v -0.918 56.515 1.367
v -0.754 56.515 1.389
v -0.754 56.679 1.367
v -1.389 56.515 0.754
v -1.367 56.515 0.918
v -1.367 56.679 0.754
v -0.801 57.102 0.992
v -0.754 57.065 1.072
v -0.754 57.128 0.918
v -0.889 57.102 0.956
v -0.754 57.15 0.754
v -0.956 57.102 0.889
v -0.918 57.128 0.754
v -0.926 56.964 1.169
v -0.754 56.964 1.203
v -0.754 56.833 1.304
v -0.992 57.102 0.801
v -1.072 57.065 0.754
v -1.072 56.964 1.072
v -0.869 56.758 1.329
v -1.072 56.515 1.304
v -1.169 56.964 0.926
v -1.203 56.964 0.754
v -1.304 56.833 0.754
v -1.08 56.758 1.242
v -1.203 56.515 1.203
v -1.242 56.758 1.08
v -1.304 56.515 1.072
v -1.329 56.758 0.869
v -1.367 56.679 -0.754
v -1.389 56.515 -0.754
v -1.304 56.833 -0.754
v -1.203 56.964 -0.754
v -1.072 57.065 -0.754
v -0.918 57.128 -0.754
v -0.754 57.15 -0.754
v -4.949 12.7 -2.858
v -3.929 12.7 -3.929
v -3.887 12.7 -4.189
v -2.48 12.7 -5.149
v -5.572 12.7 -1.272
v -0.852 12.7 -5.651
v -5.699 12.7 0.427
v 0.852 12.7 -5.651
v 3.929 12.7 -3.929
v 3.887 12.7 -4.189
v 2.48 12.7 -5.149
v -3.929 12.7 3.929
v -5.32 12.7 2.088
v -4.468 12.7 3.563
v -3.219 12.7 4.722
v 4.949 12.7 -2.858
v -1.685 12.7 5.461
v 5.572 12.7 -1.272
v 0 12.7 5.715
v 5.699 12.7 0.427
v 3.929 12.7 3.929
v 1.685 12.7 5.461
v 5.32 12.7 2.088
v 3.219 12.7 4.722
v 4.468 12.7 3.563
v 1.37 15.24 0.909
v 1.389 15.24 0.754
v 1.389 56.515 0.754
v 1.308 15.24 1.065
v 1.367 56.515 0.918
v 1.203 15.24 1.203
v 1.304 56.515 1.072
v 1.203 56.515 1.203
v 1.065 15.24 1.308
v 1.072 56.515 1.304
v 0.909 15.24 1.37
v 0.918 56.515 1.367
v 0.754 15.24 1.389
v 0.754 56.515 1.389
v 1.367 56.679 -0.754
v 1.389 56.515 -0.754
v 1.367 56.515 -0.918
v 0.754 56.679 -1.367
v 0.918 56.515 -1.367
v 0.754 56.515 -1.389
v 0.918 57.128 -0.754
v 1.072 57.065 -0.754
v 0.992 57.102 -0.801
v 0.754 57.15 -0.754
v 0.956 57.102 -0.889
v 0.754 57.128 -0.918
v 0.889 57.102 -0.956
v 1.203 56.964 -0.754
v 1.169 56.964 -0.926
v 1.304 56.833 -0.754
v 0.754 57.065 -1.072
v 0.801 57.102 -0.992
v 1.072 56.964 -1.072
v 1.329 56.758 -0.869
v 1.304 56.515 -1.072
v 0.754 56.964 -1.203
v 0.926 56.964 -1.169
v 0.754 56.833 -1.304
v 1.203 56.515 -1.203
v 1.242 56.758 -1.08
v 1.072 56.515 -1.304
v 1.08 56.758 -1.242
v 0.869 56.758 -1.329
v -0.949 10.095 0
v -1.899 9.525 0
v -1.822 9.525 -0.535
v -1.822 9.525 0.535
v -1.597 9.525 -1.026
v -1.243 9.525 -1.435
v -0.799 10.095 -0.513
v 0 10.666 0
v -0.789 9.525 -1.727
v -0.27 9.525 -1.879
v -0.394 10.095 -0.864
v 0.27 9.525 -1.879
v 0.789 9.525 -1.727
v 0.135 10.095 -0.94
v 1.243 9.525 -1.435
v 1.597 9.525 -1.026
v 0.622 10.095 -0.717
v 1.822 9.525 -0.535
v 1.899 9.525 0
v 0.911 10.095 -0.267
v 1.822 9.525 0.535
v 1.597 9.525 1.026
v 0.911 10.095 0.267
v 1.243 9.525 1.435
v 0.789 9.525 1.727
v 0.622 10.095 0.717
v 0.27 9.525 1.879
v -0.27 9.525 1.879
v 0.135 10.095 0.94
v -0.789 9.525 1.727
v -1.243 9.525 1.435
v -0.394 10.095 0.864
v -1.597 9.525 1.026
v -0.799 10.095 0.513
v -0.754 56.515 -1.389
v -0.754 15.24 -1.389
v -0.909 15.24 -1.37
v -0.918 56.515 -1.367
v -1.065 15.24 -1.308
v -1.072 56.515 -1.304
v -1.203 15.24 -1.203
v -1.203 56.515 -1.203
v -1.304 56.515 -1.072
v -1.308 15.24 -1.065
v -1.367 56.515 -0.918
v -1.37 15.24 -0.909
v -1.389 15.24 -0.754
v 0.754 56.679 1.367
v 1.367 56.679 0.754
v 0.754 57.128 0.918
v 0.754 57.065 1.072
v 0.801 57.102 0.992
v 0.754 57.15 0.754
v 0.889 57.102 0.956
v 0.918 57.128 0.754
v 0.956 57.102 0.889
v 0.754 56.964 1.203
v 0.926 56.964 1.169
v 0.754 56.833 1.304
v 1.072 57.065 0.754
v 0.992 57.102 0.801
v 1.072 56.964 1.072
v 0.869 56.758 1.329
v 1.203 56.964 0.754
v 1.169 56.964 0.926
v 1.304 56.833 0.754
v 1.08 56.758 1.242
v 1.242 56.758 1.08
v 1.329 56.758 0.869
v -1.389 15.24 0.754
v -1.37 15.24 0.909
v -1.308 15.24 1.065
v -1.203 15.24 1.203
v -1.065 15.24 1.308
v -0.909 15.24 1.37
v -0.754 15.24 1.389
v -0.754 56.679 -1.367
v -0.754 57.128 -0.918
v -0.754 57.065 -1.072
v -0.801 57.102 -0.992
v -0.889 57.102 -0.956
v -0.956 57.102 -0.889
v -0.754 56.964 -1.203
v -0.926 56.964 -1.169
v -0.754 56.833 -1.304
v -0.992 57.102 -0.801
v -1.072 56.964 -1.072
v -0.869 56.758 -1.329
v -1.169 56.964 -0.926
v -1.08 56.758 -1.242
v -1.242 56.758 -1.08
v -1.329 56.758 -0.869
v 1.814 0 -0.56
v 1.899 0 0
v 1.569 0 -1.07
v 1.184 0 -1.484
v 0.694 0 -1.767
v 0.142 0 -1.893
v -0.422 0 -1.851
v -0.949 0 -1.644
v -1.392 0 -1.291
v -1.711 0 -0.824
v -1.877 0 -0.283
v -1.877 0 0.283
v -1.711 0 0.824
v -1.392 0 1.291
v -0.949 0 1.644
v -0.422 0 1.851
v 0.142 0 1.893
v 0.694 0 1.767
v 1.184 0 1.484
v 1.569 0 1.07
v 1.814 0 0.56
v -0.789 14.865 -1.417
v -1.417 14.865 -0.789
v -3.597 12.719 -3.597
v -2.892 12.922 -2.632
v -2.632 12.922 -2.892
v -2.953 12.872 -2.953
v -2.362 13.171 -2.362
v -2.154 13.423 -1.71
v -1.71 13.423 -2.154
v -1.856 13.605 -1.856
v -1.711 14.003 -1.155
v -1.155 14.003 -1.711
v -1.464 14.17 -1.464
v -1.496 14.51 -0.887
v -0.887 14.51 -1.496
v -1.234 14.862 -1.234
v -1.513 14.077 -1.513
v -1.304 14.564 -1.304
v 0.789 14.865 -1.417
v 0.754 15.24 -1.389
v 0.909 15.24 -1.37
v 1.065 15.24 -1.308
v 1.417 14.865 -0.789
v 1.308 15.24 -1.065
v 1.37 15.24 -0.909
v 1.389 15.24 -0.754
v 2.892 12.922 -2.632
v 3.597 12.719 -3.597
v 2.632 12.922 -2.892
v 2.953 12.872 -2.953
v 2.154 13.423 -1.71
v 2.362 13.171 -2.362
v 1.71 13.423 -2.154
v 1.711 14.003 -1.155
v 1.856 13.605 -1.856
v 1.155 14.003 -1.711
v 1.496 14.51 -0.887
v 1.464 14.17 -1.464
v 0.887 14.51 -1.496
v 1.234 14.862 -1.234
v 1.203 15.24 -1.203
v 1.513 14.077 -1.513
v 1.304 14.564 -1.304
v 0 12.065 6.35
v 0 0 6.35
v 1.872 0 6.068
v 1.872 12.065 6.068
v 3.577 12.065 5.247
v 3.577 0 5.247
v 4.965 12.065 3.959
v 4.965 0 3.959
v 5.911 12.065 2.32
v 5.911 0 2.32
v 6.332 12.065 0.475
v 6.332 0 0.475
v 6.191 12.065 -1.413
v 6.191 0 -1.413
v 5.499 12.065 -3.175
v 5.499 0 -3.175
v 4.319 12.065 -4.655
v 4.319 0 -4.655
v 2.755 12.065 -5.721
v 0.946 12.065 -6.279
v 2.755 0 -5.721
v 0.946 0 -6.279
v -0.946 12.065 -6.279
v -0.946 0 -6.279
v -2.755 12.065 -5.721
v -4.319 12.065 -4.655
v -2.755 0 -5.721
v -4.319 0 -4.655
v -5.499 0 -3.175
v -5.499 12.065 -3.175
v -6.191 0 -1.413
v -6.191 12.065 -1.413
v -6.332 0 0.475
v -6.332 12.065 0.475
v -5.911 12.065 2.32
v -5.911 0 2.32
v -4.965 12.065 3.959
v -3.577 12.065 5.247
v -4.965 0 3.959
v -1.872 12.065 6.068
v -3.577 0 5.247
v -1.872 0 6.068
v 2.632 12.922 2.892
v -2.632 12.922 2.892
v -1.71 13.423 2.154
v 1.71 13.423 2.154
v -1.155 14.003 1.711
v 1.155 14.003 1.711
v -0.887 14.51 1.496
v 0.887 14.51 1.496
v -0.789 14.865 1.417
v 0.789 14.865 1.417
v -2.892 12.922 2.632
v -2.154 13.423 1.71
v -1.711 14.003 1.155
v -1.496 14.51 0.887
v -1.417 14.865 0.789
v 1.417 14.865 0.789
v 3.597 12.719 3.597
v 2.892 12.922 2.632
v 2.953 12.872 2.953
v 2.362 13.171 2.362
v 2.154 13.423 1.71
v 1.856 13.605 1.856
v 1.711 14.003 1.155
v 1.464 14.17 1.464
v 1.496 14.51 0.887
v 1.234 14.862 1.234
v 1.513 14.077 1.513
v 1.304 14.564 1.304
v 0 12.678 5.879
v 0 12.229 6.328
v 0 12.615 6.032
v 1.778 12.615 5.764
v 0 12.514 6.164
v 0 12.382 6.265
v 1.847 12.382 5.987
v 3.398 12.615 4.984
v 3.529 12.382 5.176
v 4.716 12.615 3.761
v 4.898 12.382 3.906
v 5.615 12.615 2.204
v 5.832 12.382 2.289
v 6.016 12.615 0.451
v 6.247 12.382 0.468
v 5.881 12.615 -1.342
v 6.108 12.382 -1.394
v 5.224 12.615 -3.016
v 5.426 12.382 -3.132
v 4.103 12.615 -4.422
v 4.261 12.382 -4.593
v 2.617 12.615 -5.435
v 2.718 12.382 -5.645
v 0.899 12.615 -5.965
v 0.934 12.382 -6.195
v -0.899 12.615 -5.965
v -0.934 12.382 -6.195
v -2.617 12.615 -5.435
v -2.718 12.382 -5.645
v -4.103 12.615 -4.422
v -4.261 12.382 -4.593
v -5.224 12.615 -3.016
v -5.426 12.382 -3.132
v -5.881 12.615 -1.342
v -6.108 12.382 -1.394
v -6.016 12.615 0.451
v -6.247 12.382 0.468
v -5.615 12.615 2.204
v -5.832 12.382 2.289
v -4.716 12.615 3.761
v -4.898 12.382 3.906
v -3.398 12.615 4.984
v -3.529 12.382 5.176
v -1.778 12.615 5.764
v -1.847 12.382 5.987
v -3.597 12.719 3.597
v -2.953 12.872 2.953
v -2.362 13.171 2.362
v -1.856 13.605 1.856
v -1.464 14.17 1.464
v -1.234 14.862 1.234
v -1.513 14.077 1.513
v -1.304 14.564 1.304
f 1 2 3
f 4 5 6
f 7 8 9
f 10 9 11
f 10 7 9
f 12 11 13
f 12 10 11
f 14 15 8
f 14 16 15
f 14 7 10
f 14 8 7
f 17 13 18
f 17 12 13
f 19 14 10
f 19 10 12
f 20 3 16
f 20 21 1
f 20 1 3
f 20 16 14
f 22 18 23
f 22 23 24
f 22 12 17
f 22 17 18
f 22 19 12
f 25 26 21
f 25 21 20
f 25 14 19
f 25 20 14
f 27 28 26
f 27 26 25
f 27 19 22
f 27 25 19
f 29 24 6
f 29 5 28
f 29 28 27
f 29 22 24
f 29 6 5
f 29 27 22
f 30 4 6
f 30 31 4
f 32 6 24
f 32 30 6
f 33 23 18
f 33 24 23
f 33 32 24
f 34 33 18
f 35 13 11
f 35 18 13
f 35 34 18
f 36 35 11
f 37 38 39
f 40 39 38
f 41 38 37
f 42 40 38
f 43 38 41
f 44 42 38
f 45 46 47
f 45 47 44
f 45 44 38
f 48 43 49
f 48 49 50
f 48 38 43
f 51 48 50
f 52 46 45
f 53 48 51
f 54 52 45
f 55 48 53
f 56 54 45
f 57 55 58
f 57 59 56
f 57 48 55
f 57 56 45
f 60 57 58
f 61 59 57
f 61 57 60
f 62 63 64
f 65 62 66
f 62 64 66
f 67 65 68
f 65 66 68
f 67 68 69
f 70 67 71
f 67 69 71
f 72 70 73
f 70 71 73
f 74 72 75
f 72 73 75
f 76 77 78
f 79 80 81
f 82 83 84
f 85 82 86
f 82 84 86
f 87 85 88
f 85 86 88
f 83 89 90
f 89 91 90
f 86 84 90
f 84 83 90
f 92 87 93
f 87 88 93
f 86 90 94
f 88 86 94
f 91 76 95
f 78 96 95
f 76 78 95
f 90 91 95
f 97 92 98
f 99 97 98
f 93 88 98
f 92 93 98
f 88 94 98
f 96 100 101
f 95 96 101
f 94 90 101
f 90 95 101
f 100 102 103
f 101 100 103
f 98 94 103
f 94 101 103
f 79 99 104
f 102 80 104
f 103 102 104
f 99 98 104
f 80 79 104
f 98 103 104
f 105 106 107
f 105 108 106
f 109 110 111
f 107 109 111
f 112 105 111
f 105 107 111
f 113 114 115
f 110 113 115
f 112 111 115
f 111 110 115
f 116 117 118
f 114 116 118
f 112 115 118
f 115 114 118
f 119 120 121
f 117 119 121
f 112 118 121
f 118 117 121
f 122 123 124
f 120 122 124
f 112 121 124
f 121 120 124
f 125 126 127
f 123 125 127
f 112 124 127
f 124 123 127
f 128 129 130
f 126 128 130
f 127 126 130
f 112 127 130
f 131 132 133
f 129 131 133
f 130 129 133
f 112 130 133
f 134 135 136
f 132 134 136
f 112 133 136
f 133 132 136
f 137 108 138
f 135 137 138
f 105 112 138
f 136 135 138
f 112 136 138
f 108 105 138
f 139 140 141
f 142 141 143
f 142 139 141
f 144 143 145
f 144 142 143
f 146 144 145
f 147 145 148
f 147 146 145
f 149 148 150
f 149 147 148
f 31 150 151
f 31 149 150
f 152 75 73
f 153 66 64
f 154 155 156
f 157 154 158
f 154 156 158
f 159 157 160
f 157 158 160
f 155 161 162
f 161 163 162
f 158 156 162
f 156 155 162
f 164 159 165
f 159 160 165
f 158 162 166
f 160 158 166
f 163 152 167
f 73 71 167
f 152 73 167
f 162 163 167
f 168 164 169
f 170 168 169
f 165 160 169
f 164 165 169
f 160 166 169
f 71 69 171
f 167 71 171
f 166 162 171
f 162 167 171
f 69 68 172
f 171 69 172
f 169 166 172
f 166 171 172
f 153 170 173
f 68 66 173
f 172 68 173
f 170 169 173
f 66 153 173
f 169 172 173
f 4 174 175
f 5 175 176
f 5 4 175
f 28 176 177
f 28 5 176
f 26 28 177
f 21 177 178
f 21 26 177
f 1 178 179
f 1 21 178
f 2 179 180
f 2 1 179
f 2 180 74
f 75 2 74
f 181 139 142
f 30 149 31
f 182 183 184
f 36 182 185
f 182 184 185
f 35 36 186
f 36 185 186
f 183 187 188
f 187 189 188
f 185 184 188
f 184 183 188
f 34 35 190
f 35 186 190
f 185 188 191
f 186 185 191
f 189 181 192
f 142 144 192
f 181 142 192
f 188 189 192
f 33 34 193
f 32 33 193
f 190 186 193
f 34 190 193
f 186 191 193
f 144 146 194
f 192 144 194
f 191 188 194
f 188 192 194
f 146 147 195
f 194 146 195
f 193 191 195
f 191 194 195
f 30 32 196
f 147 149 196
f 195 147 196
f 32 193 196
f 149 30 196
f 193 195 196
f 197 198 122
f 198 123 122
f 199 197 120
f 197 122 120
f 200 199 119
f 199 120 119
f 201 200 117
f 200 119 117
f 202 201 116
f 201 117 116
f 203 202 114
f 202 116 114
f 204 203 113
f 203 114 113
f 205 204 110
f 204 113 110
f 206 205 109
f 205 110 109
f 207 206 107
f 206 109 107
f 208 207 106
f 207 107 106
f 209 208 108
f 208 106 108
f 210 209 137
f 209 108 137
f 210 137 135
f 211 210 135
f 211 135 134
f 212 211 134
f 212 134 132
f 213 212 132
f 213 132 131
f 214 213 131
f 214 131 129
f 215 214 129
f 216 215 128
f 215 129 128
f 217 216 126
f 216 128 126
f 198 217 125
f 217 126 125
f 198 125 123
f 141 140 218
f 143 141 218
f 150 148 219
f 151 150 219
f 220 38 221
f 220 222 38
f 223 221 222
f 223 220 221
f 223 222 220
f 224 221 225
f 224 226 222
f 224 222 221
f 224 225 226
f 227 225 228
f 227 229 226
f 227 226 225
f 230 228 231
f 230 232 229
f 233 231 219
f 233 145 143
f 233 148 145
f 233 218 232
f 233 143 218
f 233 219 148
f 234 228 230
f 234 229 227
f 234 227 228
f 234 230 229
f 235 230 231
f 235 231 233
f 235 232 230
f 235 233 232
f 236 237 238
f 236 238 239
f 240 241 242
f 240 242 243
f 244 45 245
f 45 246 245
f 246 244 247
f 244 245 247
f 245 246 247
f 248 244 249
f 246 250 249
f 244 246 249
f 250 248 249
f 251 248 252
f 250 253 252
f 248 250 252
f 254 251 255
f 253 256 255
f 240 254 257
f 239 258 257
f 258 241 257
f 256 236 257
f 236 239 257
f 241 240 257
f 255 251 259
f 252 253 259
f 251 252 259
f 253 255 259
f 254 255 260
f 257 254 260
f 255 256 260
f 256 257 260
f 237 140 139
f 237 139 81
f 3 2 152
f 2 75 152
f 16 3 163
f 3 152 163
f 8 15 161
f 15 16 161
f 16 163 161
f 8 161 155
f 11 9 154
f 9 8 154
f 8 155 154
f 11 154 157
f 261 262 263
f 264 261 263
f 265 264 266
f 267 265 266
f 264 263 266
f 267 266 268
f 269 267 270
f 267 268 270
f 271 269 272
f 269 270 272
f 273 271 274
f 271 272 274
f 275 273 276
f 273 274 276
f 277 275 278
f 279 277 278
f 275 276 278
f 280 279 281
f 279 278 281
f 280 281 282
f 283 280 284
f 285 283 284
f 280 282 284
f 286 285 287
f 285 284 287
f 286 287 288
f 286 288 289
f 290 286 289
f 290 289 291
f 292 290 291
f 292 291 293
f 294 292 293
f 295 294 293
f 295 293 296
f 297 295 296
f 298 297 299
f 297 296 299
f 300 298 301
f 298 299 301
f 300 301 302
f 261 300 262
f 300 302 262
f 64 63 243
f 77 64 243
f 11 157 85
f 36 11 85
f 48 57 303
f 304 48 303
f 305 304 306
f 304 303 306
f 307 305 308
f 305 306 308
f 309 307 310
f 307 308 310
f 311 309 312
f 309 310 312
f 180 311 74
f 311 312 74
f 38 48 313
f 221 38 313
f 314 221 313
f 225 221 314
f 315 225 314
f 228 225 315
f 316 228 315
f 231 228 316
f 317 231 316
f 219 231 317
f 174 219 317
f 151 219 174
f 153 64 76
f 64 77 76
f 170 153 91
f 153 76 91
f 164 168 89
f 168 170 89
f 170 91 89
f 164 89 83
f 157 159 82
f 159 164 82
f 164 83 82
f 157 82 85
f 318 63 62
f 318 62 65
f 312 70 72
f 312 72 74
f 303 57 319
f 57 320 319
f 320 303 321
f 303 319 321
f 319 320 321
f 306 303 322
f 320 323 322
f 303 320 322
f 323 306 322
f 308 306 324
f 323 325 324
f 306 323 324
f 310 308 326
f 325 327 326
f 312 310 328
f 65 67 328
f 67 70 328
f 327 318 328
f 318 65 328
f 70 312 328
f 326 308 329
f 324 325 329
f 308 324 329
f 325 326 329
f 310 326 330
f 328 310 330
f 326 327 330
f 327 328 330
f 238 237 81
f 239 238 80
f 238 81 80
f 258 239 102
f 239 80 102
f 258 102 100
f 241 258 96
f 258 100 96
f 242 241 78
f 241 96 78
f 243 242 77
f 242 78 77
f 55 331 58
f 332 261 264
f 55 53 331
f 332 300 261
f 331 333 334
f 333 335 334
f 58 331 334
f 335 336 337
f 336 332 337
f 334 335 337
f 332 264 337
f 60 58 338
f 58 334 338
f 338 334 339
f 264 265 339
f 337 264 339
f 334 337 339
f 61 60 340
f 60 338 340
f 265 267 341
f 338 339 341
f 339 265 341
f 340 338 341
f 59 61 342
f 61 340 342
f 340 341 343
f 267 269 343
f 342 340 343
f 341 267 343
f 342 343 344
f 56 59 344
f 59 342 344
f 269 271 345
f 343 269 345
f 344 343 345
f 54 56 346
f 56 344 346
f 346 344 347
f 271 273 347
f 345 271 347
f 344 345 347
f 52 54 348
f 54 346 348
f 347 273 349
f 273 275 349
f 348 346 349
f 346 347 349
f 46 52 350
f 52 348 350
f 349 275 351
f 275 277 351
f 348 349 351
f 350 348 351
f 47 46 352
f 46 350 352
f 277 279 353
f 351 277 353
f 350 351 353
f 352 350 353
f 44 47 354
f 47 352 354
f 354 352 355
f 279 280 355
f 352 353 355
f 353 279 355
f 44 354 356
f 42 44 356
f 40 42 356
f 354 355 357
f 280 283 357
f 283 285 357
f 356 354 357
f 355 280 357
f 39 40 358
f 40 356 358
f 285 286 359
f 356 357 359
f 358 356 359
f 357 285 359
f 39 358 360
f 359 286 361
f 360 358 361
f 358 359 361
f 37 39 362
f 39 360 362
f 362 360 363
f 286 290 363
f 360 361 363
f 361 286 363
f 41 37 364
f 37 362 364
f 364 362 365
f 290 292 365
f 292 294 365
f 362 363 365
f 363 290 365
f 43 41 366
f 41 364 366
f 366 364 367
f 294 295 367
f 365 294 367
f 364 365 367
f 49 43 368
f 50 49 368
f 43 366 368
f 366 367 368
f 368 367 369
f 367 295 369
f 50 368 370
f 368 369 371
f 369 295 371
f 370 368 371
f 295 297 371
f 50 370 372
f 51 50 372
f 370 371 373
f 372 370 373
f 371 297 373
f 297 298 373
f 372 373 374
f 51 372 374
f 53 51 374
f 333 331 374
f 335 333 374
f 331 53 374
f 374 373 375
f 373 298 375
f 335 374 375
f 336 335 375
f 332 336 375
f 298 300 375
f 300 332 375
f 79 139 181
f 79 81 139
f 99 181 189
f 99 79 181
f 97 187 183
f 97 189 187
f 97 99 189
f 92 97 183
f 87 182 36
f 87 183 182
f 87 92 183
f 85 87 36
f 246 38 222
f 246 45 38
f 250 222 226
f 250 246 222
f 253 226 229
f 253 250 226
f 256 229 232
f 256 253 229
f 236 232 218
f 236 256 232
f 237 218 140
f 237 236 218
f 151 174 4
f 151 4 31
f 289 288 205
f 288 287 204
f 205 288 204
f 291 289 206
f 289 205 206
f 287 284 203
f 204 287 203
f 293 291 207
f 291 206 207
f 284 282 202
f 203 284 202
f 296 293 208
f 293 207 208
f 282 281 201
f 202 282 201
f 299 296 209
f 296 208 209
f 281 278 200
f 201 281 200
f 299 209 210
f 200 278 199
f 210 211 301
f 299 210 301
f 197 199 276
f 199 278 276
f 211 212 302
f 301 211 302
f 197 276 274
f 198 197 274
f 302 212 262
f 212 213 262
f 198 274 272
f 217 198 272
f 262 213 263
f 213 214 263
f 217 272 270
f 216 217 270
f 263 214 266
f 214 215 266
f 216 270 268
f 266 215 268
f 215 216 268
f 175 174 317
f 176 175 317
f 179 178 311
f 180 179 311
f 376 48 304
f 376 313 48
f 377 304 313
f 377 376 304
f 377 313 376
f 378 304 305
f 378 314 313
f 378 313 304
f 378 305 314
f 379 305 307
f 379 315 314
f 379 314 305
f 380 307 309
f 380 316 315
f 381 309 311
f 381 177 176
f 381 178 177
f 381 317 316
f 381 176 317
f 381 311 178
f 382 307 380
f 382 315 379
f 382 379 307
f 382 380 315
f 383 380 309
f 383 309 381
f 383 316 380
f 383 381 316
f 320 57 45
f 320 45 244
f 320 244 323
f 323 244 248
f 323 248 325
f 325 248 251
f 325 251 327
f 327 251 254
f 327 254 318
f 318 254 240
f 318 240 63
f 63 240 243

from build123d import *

# Parameters (mm, degrees)
SKETCH1_R                  = 6.35
BOSS_EXTRUDE1_DEPTH        = 12.7
SKETCH2_W                  = 2.778125
SKETCH2_H                  = 2.778125
BOSS_EXTRUDE2_DEPTH        = 44.45
FILLET1_R                  = 2.54
FILLET2_R                  = 0.635
F_10_24_TAPPED_HOLE1_D     = 3.7973
F_10_24_TAPPED_HOLE1_DEPTH = 9.525
F_10_24_TAPPED_HOLE1_TIP   = 1.140824014


with BuildPart() as part:
    # Sketch1 → Boss-Extrude1 (new body)
    with BuildSketch(Plane(origin=(0, 0, 0), x_dir=(0, 0, -1), z_dir=(0, 1, 0))):
        with Locations(Location((0, 0, 0), (0, 0, 180))):
            Circle(SKETCH1_R)
    extrude(amount=BOSS_EXTRUDE1_DEPTH)

    # Sketch2 → Boss-Extrude2 (add)
    with BuildSketch(Plane(origin=(-12.7, 12.7, 0), x_dir=(0, 0, -1), z_dir=(0, -1, 0))):
        with Locations((0, 12.7)):
            Rectangle(SKETCH2_W, SKETCH2_H)
    extrude(amount=-BOSS_EXTRUDE2_DEPTH)

    # Fillet1
    fillet1_edges = [part.edges().sort_by_distance(p)[0] for p in [
        (0, 12.7, -1.3890625),
        (-1.3890625, 12.7, 0),
        (1.3890625, 12.7, 0),
        (0, 12.7, 1.3890625),
    ]]
    fillet(fillet1_edges, radius=FILLET1_R)

    # Fillet2
    fillet2_edges = [part.edges().sort_by_distance(p)[0] for p in [
        (2.288098275, 13.301228117, -2.288098275),
        (-2.288098218, 13.301228166, -2.288098218),
        (2.288098215, 13.301228168, 2.288098215),
        (-2.288098198, 13.301228182, 2.288098198),
        (0, 12.7, -6.35),
        (1.3890625, 36.195, -1.3890625),
        (-1.3890625, 36.195, -1.3890625),
        (0, 57.15, 1.3890625),
        (-1.3890625, 36.195, 1.3890625),
        (1.3890625, 57.15, 0),
        (1.3890625, 36.195, 1.3890625),
        (0, 57.15, -1.3890625),
        (-1.3890625, 57.15, 0),
    ]]
    fillet(fillet2_edges, radius=FILLET2_R)

    # #10-24 Tapped Hole1
    with Locations(Plane(origin=(0, 0, 0), x_dir=(-1, 0, 0), z_dir=(0, -1, 0))):
        with Locations((0, 0)):
            Hole(F_10_24_TAPPED_HOLE1_D / 2, depth=F_10_24_TAPPED_HOLE1_DEPTH)
            with Locations((0, 0, -(F_10_24_TAPPED_HOLE1_DEPTH + F_10_24_TAPPED_HOLE1_TIP / 2))):  # 118° drill point
                Cone(0, F_10_24_TAPPED_HOLE1_D / 2, F_10_24_TAPPED_HOLE1_TIP, mode=Mode.SUBTRACT)


solid = part.part
